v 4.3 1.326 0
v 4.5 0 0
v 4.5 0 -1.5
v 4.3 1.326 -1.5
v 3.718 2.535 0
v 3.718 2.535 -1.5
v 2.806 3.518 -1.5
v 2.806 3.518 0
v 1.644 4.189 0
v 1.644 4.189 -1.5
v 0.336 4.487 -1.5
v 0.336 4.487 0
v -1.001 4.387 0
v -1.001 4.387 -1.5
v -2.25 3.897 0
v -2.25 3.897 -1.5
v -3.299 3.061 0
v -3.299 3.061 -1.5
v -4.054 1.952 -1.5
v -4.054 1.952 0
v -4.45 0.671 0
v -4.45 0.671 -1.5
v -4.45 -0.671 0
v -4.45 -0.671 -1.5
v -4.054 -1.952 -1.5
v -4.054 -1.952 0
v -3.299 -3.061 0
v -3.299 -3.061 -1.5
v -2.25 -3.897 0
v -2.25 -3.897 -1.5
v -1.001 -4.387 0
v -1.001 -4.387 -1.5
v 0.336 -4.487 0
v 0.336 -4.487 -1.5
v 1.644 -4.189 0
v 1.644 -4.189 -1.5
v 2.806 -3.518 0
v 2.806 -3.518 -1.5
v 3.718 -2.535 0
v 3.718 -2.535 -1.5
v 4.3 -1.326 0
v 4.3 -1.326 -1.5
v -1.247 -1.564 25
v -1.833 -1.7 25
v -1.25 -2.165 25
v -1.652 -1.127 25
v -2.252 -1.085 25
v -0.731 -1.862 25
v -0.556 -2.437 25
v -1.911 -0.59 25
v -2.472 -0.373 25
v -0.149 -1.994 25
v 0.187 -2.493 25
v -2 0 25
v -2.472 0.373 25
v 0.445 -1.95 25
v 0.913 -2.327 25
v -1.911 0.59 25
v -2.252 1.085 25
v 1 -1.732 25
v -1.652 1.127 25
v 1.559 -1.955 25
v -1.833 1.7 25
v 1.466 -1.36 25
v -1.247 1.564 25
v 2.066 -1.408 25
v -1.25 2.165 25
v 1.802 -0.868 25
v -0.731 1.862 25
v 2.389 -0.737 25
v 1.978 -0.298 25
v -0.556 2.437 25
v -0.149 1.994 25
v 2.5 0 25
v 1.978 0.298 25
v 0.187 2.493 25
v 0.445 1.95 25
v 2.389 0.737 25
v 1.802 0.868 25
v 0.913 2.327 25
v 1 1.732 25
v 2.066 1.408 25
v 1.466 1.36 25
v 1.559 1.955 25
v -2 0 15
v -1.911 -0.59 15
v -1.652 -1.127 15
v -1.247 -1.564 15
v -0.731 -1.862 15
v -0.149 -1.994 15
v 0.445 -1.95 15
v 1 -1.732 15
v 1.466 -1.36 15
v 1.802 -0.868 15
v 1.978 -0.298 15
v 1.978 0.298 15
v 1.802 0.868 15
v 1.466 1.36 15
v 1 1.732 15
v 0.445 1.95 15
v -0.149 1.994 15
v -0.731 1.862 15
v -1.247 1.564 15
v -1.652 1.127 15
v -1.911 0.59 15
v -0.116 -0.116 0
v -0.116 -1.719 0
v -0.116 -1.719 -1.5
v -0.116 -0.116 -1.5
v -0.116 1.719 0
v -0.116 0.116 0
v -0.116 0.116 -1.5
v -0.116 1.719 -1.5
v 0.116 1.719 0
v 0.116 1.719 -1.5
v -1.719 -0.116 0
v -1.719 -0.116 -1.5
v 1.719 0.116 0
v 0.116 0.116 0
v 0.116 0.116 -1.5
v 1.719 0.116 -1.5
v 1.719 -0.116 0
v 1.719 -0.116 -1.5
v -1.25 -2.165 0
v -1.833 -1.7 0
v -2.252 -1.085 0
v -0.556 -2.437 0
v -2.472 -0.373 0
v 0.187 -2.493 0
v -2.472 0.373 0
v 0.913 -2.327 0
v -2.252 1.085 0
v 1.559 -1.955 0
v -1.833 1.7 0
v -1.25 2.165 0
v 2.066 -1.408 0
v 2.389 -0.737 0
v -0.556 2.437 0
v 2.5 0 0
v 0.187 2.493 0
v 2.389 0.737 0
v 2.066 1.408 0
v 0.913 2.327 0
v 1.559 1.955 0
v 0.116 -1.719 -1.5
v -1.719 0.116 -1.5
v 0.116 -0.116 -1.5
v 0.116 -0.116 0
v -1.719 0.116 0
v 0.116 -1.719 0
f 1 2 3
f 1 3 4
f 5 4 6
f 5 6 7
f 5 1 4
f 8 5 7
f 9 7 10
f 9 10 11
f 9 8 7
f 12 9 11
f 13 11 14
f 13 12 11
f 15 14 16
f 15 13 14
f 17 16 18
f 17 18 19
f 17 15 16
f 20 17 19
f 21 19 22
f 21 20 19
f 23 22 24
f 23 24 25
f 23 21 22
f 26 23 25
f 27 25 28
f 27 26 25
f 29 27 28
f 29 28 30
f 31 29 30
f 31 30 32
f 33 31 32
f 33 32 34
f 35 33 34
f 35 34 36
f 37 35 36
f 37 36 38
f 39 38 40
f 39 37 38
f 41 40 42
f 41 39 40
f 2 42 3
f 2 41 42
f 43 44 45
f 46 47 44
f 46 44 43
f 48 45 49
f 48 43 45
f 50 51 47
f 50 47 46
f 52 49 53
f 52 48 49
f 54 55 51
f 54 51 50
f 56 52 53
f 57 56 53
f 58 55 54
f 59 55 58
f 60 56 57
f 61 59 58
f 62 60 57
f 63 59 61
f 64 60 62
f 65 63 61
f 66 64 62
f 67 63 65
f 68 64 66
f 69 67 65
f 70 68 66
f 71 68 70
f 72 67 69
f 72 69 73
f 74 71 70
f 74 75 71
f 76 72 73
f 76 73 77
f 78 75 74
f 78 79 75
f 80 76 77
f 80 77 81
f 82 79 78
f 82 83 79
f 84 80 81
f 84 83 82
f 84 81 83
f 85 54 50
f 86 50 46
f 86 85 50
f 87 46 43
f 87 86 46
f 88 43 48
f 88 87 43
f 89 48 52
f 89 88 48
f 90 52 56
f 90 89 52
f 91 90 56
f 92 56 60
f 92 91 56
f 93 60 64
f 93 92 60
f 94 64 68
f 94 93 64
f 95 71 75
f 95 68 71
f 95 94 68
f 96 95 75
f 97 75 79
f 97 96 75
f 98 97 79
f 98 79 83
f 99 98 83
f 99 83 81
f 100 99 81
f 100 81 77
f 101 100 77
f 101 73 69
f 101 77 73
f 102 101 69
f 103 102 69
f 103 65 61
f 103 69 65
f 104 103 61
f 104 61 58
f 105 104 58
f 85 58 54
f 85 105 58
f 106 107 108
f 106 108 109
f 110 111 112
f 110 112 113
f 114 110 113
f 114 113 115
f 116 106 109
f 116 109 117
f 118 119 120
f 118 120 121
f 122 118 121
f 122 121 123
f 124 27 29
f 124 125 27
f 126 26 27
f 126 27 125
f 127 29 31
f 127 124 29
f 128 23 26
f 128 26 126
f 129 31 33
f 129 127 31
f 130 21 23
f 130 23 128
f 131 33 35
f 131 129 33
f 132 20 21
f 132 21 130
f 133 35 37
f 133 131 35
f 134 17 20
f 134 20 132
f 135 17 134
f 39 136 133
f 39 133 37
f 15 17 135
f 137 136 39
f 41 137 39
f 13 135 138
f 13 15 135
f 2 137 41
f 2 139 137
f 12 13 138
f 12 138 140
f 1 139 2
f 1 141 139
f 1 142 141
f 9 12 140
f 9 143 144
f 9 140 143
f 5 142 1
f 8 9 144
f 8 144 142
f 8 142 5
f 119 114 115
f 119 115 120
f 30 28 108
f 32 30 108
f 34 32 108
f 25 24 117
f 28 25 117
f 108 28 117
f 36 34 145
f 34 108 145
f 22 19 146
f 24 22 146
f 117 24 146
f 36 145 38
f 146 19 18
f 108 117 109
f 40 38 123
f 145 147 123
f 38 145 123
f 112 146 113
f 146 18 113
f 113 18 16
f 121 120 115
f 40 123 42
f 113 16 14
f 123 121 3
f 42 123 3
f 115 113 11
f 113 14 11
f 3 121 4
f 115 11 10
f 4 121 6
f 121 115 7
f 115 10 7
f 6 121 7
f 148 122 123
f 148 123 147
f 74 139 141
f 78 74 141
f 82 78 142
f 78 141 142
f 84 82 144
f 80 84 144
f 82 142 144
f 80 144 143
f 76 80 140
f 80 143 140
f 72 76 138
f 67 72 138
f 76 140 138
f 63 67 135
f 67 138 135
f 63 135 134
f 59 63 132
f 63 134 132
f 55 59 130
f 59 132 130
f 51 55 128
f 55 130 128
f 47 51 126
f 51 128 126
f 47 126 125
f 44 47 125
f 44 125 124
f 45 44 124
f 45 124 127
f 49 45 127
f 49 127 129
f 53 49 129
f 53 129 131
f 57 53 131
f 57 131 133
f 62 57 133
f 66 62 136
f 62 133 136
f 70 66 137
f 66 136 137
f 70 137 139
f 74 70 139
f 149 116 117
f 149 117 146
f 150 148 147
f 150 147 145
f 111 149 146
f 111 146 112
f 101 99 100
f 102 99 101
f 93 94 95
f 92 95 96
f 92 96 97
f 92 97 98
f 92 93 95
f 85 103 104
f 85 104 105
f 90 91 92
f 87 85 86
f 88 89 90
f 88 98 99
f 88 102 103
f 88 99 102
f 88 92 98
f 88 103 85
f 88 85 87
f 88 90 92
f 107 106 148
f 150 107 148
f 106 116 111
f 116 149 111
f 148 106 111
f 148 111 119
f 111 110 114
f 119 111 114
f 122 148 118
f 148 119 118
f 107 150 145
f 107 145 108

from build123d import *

# Parameters (mm, degrees)
ESQUISSE1_R                  = 2.5
BOSS_EXTRU_1_DEPTH           = 25
ESQUISSE2_R                  = 4.5
BOSS_EXTRU_2_DEPTH           = 1.5
ENL_V_MAT_EXTRU_1_DEPTH      = 28.25344015
ENL_V_MAT_EXTRU_1_DEPTH_BACK = 10
ESQUISSE3_R                  = 2


with BuildPart() as part:
    # Esquisse1 → Boss.-Extru.1 (new body)
    with BuildSketch(Plane.XY):
        Circle(ESQUISSE1_R)
    extrude(amount=BOSS_EXTRU_1_DEPTH)

    # Esquisse2 → Boss.-Extru.2 (add)
    with BuildSketch(Plane.XY):
        Circle(ESQUISSE2_R)
        Polygon((-1.718731116, -0.115769453), (-1.718731116, 0.115769453), (-0.115769453, 0.115769453), (-0.115769453, 1.718731116), (0.115769453, 1.718731116), (0.115769453, 0.115769453), (1.718731116, 0.115769453), (1.718731116, -0.115769453), (0.115769453, -0.115769453), (0.115769453, -1.718731116), (-0.115769453, -1.718731116), (-0.115769453, -0.115769453), align=None, mode=Mode.SUBTRACT)
    extrude(amount=-BOSS_EXTRU_2_DEPTH)

    # Esquisse3 → Enlèv. mat.-Extru.1 (cut, two sides: drawn at the far end of the back side and taken through both)
    with BuildSketch(Plane.XY.offset(25).offset(-ENL_V_MAT_EXTRU_1_DEPTH_BACK)):
        with Locations(Location((0, 0, 0), (0, 0, 180))):
            Circle(ESQUISSE3_R)
    extrude(amount=ENL_V_MAT_EXTRU_1_DEPTH + ENL_V_MAT_EXTRU_1_DEPTH_BACK, mode=Mode.SUBTRACT)


solid = part.part
